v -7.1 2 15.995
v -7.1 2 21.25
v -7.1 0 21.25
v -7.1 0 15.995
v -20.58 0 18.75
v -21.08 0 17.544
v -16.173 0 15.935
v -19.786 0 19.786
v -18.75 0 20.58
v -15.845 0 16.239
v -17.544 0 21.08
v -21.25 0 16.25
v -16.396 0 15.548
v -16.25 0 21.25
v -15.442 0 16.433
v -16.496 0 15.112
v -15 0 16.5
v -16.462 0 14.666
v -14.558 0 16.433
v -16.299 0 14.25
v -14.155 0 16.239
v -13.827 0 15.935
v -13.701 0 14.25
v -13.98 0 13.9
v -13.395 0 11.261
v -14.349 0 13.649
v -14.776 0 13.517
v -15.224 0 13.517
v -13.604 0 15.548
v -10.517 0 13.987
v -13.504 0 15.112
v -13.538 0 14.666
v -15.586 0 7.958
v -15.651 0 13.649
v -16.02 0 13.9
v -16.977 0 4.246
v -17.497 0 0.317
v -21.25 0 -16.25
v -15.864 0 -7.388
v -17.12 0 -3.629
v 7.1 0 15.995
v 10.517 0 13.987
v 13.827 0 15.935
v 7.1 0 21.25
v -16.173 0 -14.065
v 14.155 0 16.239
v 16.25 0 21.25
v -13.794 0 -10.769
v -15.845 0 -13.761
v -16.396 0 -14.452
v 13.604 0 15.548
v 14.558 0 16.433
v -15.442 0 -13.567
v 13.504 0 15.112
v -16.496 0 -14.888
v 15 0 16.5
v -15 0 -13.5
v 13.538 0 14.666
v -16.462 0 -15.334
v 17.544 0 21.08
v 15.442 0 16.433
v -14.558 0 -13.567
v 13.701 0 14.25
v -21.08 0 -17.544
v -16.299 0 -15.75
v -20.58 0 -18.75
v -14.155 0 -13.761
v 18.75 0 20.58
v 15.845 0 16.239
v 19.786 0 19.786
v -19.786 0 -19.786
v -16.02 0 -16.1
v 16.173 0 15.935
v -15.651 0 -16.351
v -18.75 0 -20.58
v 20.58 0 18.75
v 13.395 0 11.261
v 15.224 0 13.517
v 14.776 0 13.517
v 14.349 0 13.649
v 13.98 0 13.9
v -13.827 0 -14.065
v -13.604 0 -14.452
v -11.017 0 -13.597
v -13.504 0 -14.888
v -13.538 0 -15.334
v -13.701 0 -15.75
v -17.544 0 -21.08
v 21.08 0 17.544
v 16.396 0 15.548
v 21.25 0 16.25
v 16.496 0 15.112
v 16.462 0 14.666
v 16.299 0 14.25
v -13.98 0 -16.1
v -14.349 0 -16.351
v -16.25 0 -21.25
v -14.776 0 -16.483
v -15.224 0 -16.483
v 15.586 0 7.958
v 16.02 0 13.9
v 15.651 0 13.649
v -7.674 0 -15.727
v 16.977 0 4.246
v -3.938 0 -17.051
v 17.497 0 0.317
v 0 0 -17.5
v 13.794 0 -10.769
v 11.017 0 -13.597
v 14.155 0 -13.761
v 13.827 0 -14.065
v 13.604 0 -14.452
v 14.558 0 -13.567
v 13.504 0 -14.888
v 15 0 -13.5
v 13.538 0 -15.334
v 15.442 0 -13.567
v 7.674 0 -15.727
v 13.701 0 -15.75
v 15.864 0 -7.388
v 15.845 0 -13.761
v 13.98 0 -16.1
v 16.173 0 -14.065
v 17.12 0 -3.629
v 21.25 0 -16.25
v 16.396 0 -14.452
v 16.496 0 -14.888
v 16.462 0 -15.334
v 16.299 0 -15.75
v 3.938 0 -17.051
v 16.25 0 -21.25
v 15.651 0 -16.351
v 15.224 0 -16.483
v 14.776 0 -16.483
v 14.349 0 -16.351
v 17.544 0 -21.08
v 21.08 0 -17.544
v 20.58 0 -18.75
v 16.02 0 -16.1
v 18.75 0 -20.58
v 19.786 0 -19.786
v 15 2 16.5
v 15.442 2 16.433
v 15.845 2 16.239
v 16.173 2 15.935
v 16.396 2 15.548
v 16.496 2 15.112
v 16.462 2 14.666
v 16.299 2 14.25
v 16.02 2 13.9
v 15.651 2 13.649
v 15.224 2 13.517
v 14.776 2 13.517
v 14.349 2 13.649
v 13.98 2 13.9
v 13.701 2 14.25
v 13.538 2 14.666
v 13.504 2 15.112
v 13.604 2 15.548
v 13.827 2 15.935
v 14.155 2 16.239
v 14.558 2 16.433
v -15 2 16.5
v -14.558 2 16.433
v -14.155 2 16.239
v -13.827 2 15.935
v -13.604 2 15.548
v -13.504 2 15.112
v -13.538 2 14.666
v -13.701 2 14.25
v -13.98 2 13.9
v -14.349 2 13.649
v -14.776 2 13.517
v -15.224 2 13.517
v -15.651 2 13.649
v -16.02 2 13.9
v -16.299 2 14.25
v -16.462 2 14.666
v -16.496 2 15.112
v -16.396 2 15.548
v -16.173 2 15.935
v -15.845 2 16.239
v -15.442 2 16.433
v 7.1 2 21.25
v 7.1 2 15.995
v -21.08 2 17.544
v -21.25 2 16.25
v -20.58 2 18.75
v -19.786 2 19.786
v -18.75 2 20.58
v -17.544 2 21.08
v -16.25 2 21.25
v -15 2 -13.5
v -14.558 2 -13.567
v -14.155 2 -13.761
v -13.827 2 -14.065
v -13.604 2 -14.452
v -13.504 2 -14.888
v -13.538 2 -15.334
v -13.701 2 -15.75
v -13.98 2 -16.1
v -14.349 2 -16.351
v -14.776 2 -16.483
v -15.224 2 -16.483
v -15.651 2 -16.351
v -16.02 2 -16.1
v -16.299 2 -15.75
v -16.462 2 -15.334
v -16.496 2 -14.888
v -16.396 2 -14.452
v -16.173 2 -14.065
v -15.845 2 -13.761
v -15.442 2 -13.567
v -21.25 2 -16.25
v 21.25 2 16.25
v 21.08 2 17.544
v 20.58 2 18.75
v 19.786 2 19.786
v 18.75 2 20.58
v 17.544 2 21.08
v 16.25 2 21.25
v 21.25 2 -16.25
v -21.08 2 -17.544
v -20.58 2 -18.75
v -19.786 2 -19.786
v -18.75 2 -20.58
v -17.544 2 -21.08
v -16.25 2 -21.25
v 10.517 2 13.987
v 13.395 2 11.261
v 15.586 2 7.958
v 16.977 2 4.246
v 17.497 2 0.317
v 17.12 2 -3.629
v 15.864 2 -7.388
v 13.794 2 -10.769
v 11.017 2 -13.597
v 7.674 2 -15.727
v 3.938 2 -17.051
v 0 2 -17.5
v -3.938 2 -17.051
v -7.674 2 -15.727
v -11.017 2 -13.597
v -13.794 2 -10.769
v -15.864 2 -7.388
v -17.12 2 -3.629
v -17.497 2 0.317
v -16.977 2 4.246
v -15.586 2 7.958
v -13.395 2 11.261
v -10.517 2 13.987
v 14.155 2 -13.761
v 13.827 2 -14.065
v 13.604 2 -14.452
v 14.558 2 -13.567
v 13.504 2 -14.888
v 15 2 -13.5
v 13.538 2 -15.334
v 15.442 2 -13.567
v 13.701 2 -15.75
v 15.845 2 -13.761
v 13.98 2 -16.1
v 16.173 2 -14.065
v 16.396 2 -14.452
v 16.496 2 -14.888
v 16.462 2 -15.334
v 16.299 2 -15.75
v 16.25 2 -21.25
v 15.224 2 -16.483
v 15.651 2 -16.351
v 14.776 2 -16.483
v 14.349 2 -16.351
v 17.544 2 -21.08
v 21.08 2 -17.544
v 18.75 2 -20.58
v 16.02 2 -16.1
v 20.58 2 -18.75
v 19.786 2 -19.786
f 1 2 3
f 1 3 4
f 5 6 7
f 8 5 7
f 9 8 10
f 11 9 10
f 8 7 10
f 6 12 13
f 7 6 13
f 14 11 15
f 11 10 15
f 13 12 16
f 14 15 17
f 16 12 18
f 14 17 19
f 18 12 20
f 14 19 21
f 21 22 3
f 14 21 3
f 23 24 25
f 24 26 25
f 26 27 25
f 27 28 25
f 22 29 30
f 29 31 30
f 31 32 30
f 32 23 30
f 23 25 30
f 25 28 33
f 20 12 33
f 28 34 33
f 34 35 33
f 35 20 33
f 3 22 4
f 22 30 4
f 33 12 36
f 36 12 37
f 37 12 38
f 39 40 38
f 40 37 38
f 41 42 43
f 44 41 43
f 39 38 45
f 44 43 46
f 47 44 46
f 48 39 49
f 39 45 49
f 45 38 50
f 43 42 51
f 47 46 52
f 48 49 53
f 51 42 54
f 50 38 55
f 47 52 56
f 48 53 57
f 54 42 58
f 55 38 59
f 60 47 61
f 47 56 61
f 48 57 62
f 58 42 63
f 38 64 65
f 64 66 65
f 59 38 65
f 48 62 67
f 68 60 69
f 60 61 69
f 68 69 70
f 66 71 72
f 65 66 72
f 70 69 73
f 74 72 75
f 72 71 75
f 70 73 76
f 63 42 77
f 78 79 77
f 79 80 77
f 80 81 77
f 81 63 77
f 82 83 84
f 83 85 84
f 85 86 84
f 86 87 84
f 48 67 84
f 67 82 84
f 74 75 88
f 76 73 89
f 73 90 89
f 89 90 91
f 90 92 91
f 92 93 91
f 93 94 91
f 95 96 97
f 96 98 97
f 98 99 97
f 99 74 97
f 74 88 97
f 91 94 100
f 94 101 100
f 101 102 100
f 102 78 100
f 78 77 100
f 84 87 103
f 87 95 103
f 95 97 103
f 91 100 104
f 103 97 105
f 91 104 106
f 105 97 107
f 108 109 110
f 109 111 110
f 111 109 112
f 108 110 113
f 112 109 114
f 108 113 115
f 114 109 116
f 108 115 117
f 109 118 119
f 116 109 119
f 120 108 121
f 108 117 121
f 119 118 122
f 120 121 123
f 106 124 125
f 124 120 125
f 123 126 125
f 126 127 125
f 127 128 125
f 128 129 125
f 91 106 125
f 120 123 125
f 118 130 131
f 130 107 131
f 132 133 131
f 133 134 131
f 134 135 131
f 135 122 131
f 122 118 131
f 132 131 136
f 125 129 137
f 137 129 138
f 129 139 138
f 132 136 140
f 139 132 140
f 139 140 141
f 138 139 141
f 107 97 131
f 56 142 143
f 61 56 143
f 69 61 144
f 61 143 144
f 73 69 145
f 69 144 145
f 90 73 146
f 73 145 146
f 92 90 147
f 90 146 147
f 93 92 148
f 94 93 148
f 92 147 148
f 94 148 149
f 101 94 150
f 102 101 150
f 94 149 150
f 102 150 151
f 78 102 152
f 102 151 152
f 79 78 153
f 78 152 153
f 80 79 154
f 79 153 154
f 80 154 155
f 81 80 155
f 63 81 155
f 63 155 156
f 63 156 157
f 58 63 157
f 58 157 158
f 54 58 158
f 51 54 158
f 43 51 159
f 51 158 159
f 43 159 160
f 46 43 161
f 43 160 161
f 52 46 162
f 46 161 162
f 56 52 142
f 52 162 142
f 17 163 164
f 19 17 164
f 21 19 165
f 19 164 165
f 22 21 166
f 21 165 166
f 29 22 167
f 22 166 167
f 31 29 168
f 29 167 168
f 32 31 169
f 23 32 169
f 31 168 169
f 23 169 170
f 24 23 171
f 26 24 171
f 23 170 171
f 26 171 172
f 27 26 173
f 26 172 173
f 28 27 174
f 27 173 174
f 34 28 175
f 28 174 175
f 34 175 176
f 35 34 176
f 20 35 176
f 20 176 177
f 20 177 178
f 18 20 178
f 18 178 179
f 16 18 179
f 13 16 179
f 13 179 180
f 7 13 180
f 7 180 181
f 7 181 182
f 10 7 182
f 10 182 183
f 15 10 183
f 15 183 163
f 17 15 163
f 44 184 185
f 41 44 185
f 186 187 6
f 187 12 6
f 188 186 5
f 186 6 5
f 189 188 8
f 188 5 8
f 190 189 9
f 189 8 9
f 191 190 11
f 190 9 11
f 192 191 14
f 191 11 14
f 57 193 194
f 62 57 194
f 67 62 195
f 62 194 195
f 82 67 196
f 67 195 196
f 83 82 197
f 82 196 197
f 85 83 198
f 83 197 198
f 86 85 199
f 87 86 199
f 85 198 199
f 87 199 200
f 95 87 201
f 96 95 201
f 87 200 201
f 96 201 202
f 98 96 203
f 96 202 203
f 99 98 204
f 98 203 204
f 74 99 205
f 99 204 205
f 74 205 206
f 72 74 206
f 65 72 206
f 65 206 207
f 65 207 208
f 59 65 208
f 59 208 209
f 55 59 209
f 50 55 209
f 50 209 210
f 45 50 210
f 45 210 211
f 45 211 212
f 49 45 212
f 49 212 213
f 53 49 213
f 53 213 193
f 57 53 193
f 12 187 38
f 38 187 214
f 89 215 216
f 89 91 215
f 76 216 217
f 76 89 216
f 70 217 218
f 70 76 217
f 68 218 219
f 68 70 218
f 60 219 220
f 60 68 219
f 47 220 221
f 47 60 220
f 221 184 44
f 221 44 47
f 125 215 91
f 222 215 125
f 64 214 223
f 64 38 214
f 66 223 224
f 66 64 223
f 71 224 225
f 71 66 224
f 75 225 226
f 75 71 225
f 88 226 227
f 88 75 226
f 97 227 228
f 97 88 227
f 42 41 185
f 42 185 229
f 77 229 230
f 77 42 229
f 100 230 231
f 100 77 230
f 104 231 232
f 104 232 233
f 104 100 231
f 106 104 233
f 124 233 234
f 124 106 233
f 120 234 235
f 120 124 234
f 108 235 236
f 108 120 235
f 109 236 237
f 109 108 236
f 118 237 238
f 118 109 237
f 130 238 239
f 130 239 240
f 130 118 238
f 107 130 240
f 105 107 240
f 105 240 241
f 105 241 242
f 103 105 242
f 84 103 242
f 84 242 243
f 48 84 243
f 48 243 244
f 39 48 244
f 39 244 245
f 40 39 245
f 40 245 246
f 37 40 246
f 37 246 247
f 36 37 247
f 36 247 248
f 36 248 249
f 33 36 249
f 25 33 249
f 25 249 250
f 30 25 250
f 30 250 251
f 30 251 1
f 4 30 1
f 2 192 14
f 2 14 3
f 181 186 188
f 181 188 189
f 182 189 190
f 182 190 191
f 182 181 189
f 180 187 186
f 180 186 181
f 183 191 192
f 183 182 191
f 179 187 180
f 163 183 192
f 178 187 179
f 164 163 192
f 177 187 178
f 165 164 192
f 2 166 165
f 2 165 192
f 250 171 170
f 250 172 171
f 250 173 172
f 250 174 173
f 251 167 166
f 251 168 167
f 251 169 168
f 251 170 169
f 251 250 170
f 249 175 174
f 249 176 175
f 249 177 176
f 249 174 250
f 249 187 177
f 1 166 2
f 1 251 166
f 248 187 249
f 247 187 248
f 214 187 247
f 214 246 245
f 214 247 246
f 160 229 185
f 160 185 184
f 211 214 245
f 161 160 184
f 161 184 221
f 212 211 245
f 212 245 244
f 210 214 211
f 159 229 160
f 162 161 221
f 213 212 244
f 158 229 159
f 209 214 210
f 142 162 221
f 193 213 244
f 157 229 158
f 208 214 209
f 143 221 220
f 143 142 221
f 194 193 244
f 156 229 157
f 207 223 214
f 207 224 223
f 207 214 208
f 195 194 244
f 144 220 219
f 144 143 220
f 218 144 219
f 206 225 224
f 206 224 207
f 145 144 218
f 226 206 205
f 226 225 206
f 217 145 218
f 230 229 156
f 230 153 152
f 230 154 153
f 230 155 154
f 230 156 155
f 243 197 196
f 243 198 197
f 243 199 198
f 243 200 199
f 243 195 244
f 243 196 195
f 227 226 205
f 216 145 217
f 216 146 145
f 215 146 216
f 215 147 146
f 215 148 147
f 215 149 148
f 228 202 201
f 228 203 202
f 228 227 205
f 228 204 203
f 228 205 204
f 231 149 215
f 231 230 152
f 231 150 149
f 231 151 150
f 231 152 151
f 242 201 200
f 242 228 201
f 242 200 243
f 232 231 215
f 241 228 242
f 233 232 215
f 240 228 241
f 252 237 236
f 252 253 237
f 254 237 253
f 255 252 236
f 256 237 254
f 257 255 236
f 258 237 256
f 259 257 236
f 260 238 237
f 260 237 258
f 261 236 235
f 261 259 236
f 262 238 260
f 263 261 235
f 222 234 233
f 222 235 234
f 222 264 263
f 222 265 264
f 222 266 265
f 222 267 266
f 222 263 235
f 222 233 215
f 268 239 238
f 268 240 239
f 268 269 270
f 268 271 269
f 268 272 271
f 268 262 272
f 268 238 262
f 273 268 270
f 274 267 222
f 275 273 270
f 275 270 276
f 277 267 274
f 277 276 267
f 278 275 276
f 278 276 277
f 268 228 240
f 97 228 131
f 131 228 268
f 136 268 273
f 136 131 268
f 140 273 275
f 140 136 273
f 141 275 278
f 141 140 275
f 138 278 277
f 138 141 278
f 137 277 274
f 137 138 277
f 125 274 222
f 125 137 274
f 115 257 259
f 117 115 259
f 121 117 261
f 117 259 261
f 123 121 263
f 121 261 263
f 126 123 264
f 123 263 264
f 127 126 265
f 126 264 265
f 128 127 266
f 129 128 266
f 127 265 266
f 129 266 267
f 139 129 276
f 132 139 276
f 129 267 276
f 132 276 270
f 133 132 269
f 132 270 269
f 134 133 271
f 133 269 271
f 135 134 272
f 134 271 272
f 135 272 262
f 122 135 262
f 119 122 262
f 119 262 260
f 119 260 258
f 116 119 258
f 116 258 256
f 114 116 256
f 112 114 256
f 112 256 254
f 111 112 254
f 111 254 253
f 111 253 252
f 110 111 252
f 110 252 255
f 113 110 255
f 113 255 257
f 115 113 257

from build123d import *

# Parameters (mm, degrees)
SKETCH1_W           = 40.5
SKETCH1_H           = 40.5
SKETCH1_R           = 17.5
BOSS_EXTRUDE1_DEPTH = 2
SKETCH2_R           = 1.25
CUT_EXTRUDE1_DEPTH  = 2
CUT_EXTRUDE2_DEPTH  = 2
SKETCH4_W           = 42.5
SKETCH4_H           = 42.5
SKETCH4_W_2         = 40.5
SKETCH4_H_2         = 40.5
BOSS_EXTRUDE2_DEPTH = 2
SKETCH5_W           = 14.2
SKETCH5_H           = 2
CUT_EXTRUDE3_DEPTH  = 2
SKETCH6_R           = 1.5
CUT_EXTRUDE4_DEPTH  = 3.5
SKETCH7_R           = 1.5
BOSS_EXTRUDE3_DEPTH = 2
SKETCH8_R           = 1.5
CUT_EXTRUDE5_DEPTH  = 2
FILLET2_R           = 5


with BuildPart() as part:
    # Sketch1 → Boss-Extrude1 (new body)
    with BuildSketch(Plane(origin=(0, 0, 0), x_dir=(1, 0, 0), z_dir=(0, 1, 0))):
        Rectangle(SKETCH1_W, SKETCH1_H)
        with Locations(Location((0, 0, 0), (0, 0, 270))):
            Circle(SKETCH1_R, mode=Mode.SUBTRACT)
    extrude(amount=BOSS_EXTRUDE1_DEPTH)

    # Sketch2 → Cut-Extrude1 (cut)
    with BuildSketch(Plane(origin=(0, 2, 0), x_dir=(1, 0, 0), z_dir=(0, 1, 0))):
        with Locations(Location((-15, 15, 0), (0, 0, 270))):
            Circle(SKETCH2_R)
        with Locations(Location((15, 15, 0), (0, 0, 270))):
            Circle(SKETCH2_R)
        with Locations(Location((-15, -15, 0), (0, 0, 270))):
            Circle(SKETCH2_R)
        with Locations(Location((15, -16.25, 0), (0, 0, 270))):
            Circle(SKETCH2_R)
    extrude(amount=-CUT_EXTRUDE1_DEPTH, mode=Mode.SUBTRACT)

    # Sketch3 → Cut-Extrude2 (cut)
    with BuildSketch(Plane(origin=(0, 2, 0), x_dir=(1, 0, 0), z_dir=(0, 1, 0))):
        Polygon((0, -20.25), (7.1, -20.25), (7.1, -15.994999219), (-7.1, -15.994999219), (-7.1, -20.25), align=None)
    extrude(amount=-CUT_EXTRUDE2_DEPTH, mode=Mode.SUBTRACT)

    # Sketch4 → Boss-Extrude2 (add)
    with BuildSketch(Plane(origin=(0, 2, 0), x_dir=(1, 0, 0), z_dir=(0, 1, 0))):
        Rectangle(SKETCH4_W, SKETCH4_H)
        Rectangle(SKETCH4_W_2, SKETCH4_H_2, mode=Mode.SUBTRACT)
    extrude(amount=-BOSS_EXTRUDE2_DEPTH)

    # Sketch5 → Cut-Extrude3 (cut)
    with BuildSketch(Plane(origin=(0, 2, 0), x_dir=(1, 0, 0), z_dir=(0, 1, 0))):
        with Locations((0, -21.25)):
            Rectangle(SKETCH5_W, SKETCH5_H)
    extrude(amount=-CUT_EXTRUDE3_DEPTH, mode=Mode.SUBTRACT)

    # Sketch6 → Cut-Extrude4 (cut)
    with BuildSketch(Plane(origin=(0, 2, 0), x_dir=(1, 0, 0), z_dir=(0, 1, 0))):
        with Locations(Location((-15, 15, 0), (0, 0, 270))):
            Circle(SKETCH6_R)
        with Locations(Location((15, 15, 0), (0, 0, 270))):
            Circle(SKETCH6_R)
        with Locations(Location((15, -16.25, 0), (0, 0, 270))):
            Circle(SKETCH6_R)
        with Locations(Location((-15, -15, 0), (0, 0, 270))):
            Circle(SKETCH6_R)
    extrude(amount=-CUT_EXTRUDE4_DEPTH, mode=Mode.SUBTRACT)

    # Sketch7 → Boss-Extrude3 (add)
    with BuildSketch(Plane(origin=(0, 2, 0), x_dir=(1, 0, 0), z_dir=(0, 1, 0))):
        with Locations((15, -16.25)):
            Circle(SKETCH7_R)
    extrude(amount=-BOSS_EXTRUDE3_DEPTH)

    # Sketch8 → Cut-Extrude5 (cut)
    with BuildSketch(Plane(origin=(0, 2, 0), x_dir=(1, 0, 0), z_dir=(0, 1, 0))):
        with Locations(Location((15, -15, 0), (0, 0, 270))):
            Circle(SKETCH8_R)
    extrude(amount=-CUT_EXTRUDE5_DEPTH, mode=Mode.SUBTRACT)

    # Fillet2
    fillet2_edges = [part.edges().sort_by_distance(p)[0] for p in [
        (-21.25, 1, 21.25),
        (-21.25, 1, -21.25),
        (21.25, 1, -21.25),
        (21.25, 1, 21.25),
    ]]
    fillet(fillet2_edges, radius=FILLET2_R)


solid = part.part
